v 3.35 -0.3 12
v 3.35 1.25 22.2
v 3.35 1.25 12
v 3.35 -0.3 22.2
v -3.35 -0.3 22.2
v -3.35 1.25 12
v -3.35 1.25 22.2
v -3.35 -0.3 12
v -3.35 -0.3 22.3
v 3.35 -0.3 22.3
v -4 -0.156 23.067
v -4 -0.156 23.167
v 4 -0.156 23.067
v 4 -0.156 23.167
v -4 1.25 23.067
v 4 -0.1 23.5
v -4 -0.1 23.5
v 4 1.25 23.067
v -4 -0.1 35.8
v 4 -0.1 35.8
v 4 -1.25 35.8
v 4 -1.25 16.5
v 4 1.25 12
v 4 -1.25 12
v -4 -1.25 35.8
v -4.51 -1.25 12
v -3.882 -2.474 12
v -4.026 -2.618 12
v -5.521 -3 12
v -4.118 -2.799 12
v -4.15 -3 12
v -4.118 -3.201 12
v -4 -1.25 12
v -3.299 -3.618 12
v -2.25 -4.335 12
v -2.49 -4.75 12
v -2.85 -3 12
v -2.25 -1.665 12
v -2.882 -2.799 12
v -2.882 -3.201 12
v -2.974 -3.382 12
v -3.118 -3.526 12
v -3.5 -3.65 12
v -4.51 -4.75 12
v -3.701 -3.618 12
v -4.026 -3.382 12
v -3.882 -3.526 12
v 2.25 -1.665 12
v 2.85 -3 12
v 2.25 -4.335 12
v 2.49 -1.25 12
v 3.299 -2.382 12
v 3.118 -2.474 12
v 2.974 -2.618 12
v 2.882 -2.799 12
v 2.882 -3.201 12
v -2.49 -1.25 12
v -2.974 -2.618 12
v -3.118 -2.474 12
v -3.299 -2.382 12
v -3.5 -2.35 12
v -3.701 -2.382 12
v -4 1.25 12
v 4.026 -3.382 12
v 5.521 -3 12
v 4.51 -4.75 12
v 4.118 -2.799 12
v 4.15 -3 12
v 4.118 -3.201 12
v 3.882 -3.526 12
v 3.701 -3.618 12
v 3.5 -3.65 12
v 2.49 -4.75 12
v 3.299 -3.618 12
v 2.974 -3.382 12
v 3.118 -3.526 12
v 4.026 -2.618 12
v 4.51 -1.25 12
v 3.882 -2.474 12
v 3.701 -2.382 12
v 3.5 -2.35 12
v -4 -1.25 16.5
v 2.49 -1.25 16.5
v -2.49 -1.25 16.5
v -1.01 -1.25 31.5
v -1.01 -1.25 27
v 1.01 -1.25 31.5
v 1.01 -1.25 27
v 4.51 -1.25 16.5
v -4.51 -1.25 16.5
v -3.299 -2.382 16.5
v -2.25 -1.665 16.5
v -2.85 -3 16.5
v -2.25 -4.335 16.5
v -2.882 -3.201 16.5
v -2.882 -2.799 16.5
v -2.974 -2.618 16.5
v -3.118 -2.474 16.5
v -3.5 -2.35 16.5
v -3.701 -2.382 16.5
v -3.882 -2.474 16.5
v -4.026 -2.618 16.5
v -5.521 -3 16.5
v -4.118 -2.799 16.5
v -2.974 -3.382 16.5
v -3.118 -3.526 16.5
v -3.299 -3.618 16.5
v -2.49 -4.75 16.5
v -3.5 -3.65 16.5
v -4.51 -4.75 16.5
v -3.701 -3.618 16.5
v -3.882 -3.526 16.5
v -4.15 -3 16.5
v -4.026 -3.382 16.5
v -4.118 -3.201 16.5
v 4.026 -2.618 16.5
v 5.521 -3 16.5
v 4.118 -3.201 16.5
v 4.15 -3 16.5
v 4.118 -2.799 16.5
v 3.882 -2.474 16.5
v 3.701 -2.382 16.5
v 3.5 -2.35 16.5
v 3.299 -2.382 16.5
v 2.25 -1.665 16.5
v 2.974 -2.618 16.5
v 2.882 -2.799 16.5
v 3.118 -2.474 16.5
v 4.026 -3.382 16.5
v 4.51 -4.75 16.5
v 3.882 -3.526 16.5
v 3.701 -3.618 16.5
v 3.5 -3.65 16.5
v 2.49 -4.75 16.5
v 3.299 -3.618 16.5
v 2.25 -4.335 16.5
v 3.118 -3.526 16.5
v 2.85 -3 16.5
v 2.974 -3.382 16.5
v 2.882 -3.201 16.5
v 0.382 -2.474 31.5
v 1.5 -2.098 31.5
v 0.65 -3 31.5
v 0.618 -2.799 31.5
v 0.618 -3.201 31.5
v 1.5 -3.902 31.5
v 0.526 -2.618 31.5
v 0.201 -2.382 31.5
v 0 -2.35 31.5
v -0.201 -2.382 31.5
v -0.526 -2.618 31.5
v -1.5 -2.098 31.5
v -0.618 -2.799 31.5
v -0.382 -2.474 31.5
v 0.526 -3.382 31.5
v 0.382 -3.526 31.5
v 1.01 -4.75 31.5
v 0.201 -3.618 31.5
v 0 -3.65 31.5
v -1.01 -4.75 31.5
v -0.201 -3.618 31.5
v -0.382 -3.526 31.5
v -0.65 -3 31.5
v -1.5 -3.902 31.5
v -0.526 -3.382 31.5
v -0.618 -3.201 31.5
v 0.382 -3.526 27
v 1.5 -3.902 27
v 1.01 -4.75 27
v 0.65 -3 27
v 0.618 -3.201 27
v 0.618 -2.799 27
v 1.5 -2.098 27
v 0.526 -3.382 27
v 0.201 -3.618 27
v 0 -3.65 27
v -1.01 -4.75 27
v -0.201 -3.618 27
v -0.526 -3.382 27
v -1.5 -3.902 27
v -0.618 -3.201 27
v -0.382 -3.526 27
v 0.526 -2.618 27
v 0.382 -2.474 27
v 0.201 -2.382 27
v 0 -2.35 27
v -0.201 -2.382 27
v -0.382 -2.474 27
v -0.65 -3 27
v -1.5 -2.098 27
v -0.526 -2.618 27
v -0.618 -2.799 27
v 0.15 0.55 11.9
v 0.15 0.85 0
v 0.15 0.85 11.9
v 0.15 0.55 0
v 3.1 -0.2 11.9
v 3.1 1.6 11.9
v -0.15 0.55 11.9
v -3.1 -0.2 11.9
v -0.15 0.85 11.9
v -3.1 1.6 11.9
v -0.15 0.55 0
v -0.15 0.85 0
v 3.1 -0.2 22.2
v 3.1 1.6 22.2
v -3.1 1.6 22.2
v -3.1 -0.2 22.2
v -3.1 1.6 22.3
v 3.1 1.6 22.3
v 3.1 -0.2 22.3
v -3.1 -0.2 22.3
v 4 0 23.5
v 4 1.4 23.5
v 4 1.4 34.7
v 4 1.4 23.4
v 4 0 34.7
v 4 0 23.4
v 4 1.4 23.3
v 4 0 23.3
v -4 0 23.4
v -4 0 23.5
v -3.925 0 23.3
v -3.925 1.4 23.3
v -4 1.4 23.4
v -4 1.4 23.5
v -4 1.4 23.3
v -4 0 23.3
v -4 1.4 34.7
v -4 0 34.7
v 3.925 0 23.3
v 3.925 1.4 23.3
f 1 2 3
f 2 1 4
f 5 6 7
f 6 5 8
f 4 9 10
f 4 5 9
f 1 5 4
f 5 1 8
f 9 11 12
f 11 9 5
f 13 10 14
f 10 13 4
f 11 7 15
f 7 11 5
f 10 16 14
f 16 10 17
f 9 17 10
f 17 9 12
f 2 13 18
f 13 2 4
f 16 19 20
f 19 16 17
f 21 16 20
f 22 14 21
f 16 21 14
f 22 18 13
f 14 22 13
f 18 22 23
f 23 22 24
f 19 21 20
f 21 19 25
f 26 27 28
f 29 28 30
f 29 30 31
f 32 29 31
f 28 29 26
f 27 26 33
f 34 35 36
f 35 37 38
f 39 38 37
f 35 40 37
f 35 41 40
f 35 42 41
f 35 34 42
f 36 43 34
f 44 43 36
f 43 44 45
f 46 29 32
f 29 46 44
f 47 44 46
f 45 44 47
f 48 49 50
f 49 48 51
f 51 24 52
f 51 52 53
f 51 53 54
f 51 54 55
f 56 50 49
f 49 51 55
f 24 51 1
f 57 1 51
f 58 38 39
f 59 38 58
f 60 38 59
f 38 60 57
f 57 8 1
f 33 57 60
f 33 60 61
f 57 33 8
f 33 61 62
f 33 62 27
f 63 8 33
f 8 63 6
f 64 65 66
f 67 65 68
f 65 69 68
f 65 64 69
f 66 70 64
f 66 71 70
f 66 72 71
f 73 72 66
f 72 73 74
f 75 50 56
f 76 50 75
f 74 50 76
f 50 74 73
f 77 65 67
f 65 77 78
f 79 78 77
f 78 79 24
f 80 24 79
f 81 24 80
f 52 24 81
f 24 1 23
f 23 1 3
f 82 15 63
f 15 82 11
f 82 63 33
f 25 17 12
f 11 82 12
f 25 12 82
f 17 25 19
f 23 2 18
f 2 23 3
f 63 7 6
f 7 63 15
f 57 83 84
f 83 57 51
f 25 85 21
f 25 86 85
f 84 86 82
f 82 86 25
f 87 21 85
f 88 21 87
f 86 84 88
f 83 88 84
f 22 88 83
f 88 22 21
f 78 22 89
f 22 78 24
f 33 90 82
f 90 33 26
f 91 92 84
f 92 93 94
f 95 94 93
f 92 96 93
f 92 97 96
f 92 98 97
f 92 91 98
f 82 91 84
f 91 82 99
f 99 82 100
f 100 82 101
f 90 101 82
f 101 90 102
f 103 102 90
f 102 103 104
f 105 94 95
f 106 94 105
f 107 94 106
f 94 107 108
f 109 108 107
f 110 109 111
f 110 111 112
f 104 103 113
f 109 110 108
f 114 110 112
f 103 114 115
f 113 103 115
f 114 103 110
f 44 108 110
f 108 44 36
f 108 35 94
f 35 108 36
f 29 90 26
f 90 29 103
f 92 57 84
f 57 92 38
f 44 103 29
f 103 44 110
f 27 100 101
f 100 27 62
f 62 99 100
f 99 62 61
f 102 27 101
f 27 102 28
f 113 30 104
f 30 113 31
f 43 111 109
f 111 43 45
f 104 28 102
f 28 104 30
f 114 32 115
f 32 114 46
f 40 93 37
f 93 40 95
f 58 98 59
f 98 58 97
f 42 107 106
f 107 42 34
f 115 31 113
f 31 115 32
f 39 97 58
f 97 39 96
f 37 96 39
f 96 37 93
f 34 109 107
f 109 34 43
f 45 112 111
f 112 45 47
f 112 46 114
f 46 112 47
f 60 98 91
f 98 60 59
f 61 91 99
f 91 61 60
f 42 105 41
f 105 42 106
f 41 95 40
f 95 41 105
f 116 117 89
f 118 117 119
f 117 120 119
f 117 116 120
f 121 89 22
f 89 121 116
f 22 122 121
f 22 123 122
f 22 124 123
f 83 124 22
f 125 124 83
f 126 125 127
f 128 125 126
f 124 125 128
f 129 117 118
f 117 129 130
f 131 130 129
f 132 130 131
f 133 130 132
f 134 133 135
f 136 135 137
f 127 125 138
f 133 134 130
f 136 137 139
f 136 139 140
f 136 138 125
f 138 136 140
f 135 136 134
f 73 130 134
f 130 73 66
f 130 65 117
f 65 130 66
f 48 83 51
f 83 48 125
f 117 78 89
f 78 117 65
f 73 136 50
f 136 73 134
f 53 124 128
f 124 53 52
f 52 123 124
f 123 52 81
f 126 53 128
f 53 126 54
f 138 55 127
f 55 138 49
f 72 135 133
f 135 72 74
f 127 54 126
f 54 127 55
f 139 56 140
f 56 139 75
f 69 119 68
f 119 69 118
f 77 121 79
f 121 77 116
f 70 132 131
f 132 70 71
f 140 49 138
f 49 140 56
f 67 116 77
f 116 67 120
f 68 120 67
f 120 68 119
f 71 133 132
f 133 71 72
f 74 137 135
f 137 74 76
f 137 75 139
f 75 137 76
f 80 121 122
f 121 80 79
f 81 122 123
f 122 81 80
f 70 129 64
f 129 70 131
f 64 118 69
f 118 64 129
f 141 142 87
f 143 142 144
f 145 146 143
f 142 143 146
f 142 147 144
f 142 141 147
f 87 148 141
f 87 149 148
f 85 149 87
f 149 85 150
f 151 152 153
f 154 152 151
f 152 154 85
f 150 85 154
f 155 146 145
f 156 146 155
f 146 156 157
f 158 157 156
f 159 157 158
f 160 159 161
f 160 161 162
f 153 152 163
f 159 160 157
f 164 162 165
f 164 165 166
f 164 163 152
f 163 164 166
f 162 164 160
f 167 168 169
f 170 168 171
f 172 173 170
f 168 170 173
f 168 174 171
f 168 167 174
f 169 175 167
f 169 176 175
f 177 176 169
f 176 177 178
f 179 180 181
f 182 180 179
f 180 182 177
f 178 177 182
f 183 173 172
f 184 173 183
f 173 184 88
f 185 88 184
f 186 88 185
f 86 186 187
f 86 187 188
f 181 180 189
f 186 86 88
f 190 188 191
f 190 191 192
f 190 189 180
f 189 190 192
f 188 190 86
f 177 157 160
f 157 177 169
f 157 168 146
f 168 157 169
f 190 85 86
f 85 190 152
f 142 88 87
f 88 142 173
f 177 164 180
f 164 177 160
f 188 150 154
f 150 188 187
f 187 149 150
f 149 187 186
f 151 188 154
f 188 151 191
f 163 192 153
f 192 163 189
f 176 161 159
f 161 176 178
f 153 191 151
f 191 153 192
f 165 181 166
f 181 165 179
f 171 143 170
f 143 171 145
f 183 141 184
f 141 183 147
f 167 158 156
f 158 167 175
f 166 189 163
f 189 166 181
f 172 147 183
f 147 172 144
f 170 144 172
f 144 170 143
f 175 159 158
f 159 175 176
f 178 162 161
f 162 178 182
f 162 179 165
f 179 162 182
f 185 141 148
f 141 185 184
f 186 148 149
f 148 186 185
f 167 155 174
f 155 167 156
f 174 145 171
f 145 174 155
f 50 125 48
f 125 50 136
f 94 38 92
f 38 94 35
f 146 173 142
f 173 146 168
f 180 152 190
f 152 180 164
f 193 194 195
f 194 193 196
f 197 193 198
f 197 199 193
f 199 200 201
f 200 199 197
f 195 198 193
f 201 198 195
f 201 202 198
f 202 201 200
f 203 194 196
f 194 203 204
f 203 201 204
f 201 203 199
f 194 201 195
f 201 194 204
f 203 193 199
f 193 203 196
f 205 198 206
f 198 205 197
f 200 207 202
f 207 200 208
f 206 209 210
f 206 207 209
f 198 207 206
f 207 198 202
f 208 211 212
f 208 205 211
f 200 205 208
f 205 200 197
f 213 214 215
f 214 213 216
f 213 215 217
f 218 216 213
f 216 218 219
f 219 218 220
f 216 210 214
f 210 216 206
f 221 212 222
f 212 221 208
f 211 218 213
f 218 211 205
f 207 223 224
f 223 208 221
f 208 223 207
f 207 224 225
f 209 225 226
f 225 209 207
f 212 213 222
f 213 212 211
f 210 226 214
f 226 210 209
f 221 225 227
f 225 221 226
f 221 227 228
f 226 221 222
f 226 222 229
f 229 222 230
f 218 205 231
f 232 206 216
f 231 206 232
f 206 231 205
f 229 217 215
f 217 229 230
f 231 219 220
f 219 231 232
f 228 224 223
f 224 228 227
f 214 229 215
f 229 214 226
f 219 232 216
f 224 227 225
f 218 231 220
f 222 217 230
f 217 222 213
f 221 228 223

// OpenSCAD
$fs=0.1;
$fn=20;

/*

plastic parts for neuropixels1.0 probe implantation


*/

module screw_M1(length=6.5, head_length=0.65, head_diameter=2.0, thread_diameter=0.95){
    cylinder(h=length,d=thread_diameter);
    cylinder(h=head_length,d=head_diameter);
}



module plus(diameter=0.5, length=3){
    translate([-length/2,0,0])rotate([0,90,0])cylinder(d=diameter,h=length);
    translate([0,length/2,0])rotate([90,0,0])cylinder(d=diameter,h=length);
    translate([0,0,-length/2])rotate([0,0,0])cylinder(d=diameter,h=length);
}

module grid(diameter=0.4, unit_space = 2, unit_length= 2, xn = 10, yn= 10, zn = 3)
{
    for ( x = [0 : xn-1] ){
        for( y = [0 : yn-1]){
            for ( z = [0 : zn-1]){
        translate([x*unit_space,y*unit_space,z*unit_space])plus(diameter=diameter,length=unit_length);            
        }
    }
   }
}


// hexagone shape for nuts 
function cot(x)=1/tan(x);
module hexagone (height=0.95,width=3){
    angle = 360/6;		// 6 pans
	cote = width * cot(angle);
	translate([0,0,height/2])
    union()
	{
		rotate([0,0,0])
			cube([width,cote,height],center=true);
		rotate([0,0,angle])
			cube([width,cote,height],center=true);
		rotate([0,0,2*angle])
			cube([width,cote,height],center=true);
	}
}
module nut(width=3,height=0.95,hole_diameter=1.1){
    difference(){
        hexagone(height=height,width=width);
        translate([0,0,-0.5])cylinder(d=hole_diameter,h=height+1);
    }
}


// to attache 2 parts
module captive_nut(width = 3.6, nut_width = 3.1, height_nut = 1, height_below=1.1, height_above=0.6,screw_diameter = 1.3,positive=true){
    if(positive){ // we want the structure
    difference(){
    // body
    hexagone(height=height_nut+height_below+height_above,width=width);
    // entry point for nut
    hull(){
        translate([-0.2,0,height_below])hexagone(height=height_nut,width=nut_width);
        translate([width,0,height_below])hexagone(height=height_nut,width=nut_width);
    }
    // hole for the screw
    translate([0,0,height_below])cylinder(h=height_nut+height_above+1,d=screw_diameter);
    }}
    else{ // just get the space for the screw
     hull(){
        translate([-0.2,0,height_below])hexagone(height=height_nut,width=nut_width);
        translate([width,0,height_below])hexagone(height=height_nut,width=nut_width);
    }
    }
    
}

// size of the Neuropixels1.0 probe
probeBoxS=[6.2, 1.8,10.4];
probeTransitionZ = 1.0;
probePcbS=[8,1.4,11.4];
probeShankS = [0.3,0.3,11.9];


// this is a Neuropixels1.0 probe
module probe(boxS=[6.2, 1.8,10.4],
             transitionZ = 1.0,
             pcbS=[8,1.4,11.4],
             shankS = [0.3,0.3,11.9])
{
    // shank
    translate([-shankS[0]/2,-shankS[1]/2,0])cube(shankS);
    
    // box above shank
    translate([-boxS[0]/2,-boxS[1]/2,shankS[2]])cube(boxS);
    
    // transition
    hull(){
    translate([-boxS[0]/2,-boxS[1]/2,shankS[2]+boxS[2]-0.1])cube([boxS[0],boxS[1],0.1]);
    translate([-pcbS[0]/2,-pcbS[1]/2,shankS[2]+boxS[2]+transitionZ+0.1])cube([pcbS[0],pcbS[1],0.1]);  
            
    }
    
    // pcb
    translate([-pcbS[0]/2,-pcbS[1]/2,shankS[2]+boxS[2]+transitionZ])cube(pcbS);
}


// plate to mount the probe on
module probePlate(plateS=[8,2.5,23.8],
                  tol = 0.5,
                  shankHeight=12,
                  screwYSpacing=7,
                  screwZSpacing=15,
                  screwWidth=3.5
){
                 
   difference(){
    // square shape
    translate([-plateS[0]/2,-plateS[1]/2,shankHeight])cube(plateS);
    // remove the probe
    translate([0,0.6,0])probe(boxS=[probeBoxS[0]+tol,probeBoxS[1],probeBoxS[2]],
                            pcbS=[probePcbS[0]+tol,probePcbS[1],probePcbS[2]+2]);
   }
   
   // add 3 attachment/hole for screws that will secure the probePlate to the probePlateCasing
   difference(){
   union(){
    translate([-screwYSpacing/2,-screwWidth/2-plateS[1]/2,shankHeight])rotate([0,0,90])nut(height=4.5,width = screwWidth,hole_diameter=1.3);
    translate([screwYSpacing/2,-screwWidth/2-plateS[1]/2,shankHeight])rotate([0,0,90])nut(height=4.5,width = screwWidth,hole_diameter=1.3);
    translate([0,-screwWidth/2-plateS[1]/2,shankHeight+screwZSpacing])rotate([0,0,90])nut(height=4.5,width = screwWidth,hole_diameter=1.3);
   }
   // remove some materials from the nuts (could be implement in nut module)
   translate([-(screwWidth+1)/2,-5,shankHeight-0.1])cube([screwWidth+1,10,10]);
   translate([screwWidth/2-0.25,-5,shankHeight+screwZSpacing-0.1])cube([screwWidth+1,10,10]);
   translate([-(screwWidth+1)-screwWidth/2+0.25,-5,shankHeight+screwZSpacing-0.1])cube([screwWidth+1,10,10]);
   
   
   }
   
   
   
}


probePlate();
color("blue")translate([0,0.7,0])probe();
